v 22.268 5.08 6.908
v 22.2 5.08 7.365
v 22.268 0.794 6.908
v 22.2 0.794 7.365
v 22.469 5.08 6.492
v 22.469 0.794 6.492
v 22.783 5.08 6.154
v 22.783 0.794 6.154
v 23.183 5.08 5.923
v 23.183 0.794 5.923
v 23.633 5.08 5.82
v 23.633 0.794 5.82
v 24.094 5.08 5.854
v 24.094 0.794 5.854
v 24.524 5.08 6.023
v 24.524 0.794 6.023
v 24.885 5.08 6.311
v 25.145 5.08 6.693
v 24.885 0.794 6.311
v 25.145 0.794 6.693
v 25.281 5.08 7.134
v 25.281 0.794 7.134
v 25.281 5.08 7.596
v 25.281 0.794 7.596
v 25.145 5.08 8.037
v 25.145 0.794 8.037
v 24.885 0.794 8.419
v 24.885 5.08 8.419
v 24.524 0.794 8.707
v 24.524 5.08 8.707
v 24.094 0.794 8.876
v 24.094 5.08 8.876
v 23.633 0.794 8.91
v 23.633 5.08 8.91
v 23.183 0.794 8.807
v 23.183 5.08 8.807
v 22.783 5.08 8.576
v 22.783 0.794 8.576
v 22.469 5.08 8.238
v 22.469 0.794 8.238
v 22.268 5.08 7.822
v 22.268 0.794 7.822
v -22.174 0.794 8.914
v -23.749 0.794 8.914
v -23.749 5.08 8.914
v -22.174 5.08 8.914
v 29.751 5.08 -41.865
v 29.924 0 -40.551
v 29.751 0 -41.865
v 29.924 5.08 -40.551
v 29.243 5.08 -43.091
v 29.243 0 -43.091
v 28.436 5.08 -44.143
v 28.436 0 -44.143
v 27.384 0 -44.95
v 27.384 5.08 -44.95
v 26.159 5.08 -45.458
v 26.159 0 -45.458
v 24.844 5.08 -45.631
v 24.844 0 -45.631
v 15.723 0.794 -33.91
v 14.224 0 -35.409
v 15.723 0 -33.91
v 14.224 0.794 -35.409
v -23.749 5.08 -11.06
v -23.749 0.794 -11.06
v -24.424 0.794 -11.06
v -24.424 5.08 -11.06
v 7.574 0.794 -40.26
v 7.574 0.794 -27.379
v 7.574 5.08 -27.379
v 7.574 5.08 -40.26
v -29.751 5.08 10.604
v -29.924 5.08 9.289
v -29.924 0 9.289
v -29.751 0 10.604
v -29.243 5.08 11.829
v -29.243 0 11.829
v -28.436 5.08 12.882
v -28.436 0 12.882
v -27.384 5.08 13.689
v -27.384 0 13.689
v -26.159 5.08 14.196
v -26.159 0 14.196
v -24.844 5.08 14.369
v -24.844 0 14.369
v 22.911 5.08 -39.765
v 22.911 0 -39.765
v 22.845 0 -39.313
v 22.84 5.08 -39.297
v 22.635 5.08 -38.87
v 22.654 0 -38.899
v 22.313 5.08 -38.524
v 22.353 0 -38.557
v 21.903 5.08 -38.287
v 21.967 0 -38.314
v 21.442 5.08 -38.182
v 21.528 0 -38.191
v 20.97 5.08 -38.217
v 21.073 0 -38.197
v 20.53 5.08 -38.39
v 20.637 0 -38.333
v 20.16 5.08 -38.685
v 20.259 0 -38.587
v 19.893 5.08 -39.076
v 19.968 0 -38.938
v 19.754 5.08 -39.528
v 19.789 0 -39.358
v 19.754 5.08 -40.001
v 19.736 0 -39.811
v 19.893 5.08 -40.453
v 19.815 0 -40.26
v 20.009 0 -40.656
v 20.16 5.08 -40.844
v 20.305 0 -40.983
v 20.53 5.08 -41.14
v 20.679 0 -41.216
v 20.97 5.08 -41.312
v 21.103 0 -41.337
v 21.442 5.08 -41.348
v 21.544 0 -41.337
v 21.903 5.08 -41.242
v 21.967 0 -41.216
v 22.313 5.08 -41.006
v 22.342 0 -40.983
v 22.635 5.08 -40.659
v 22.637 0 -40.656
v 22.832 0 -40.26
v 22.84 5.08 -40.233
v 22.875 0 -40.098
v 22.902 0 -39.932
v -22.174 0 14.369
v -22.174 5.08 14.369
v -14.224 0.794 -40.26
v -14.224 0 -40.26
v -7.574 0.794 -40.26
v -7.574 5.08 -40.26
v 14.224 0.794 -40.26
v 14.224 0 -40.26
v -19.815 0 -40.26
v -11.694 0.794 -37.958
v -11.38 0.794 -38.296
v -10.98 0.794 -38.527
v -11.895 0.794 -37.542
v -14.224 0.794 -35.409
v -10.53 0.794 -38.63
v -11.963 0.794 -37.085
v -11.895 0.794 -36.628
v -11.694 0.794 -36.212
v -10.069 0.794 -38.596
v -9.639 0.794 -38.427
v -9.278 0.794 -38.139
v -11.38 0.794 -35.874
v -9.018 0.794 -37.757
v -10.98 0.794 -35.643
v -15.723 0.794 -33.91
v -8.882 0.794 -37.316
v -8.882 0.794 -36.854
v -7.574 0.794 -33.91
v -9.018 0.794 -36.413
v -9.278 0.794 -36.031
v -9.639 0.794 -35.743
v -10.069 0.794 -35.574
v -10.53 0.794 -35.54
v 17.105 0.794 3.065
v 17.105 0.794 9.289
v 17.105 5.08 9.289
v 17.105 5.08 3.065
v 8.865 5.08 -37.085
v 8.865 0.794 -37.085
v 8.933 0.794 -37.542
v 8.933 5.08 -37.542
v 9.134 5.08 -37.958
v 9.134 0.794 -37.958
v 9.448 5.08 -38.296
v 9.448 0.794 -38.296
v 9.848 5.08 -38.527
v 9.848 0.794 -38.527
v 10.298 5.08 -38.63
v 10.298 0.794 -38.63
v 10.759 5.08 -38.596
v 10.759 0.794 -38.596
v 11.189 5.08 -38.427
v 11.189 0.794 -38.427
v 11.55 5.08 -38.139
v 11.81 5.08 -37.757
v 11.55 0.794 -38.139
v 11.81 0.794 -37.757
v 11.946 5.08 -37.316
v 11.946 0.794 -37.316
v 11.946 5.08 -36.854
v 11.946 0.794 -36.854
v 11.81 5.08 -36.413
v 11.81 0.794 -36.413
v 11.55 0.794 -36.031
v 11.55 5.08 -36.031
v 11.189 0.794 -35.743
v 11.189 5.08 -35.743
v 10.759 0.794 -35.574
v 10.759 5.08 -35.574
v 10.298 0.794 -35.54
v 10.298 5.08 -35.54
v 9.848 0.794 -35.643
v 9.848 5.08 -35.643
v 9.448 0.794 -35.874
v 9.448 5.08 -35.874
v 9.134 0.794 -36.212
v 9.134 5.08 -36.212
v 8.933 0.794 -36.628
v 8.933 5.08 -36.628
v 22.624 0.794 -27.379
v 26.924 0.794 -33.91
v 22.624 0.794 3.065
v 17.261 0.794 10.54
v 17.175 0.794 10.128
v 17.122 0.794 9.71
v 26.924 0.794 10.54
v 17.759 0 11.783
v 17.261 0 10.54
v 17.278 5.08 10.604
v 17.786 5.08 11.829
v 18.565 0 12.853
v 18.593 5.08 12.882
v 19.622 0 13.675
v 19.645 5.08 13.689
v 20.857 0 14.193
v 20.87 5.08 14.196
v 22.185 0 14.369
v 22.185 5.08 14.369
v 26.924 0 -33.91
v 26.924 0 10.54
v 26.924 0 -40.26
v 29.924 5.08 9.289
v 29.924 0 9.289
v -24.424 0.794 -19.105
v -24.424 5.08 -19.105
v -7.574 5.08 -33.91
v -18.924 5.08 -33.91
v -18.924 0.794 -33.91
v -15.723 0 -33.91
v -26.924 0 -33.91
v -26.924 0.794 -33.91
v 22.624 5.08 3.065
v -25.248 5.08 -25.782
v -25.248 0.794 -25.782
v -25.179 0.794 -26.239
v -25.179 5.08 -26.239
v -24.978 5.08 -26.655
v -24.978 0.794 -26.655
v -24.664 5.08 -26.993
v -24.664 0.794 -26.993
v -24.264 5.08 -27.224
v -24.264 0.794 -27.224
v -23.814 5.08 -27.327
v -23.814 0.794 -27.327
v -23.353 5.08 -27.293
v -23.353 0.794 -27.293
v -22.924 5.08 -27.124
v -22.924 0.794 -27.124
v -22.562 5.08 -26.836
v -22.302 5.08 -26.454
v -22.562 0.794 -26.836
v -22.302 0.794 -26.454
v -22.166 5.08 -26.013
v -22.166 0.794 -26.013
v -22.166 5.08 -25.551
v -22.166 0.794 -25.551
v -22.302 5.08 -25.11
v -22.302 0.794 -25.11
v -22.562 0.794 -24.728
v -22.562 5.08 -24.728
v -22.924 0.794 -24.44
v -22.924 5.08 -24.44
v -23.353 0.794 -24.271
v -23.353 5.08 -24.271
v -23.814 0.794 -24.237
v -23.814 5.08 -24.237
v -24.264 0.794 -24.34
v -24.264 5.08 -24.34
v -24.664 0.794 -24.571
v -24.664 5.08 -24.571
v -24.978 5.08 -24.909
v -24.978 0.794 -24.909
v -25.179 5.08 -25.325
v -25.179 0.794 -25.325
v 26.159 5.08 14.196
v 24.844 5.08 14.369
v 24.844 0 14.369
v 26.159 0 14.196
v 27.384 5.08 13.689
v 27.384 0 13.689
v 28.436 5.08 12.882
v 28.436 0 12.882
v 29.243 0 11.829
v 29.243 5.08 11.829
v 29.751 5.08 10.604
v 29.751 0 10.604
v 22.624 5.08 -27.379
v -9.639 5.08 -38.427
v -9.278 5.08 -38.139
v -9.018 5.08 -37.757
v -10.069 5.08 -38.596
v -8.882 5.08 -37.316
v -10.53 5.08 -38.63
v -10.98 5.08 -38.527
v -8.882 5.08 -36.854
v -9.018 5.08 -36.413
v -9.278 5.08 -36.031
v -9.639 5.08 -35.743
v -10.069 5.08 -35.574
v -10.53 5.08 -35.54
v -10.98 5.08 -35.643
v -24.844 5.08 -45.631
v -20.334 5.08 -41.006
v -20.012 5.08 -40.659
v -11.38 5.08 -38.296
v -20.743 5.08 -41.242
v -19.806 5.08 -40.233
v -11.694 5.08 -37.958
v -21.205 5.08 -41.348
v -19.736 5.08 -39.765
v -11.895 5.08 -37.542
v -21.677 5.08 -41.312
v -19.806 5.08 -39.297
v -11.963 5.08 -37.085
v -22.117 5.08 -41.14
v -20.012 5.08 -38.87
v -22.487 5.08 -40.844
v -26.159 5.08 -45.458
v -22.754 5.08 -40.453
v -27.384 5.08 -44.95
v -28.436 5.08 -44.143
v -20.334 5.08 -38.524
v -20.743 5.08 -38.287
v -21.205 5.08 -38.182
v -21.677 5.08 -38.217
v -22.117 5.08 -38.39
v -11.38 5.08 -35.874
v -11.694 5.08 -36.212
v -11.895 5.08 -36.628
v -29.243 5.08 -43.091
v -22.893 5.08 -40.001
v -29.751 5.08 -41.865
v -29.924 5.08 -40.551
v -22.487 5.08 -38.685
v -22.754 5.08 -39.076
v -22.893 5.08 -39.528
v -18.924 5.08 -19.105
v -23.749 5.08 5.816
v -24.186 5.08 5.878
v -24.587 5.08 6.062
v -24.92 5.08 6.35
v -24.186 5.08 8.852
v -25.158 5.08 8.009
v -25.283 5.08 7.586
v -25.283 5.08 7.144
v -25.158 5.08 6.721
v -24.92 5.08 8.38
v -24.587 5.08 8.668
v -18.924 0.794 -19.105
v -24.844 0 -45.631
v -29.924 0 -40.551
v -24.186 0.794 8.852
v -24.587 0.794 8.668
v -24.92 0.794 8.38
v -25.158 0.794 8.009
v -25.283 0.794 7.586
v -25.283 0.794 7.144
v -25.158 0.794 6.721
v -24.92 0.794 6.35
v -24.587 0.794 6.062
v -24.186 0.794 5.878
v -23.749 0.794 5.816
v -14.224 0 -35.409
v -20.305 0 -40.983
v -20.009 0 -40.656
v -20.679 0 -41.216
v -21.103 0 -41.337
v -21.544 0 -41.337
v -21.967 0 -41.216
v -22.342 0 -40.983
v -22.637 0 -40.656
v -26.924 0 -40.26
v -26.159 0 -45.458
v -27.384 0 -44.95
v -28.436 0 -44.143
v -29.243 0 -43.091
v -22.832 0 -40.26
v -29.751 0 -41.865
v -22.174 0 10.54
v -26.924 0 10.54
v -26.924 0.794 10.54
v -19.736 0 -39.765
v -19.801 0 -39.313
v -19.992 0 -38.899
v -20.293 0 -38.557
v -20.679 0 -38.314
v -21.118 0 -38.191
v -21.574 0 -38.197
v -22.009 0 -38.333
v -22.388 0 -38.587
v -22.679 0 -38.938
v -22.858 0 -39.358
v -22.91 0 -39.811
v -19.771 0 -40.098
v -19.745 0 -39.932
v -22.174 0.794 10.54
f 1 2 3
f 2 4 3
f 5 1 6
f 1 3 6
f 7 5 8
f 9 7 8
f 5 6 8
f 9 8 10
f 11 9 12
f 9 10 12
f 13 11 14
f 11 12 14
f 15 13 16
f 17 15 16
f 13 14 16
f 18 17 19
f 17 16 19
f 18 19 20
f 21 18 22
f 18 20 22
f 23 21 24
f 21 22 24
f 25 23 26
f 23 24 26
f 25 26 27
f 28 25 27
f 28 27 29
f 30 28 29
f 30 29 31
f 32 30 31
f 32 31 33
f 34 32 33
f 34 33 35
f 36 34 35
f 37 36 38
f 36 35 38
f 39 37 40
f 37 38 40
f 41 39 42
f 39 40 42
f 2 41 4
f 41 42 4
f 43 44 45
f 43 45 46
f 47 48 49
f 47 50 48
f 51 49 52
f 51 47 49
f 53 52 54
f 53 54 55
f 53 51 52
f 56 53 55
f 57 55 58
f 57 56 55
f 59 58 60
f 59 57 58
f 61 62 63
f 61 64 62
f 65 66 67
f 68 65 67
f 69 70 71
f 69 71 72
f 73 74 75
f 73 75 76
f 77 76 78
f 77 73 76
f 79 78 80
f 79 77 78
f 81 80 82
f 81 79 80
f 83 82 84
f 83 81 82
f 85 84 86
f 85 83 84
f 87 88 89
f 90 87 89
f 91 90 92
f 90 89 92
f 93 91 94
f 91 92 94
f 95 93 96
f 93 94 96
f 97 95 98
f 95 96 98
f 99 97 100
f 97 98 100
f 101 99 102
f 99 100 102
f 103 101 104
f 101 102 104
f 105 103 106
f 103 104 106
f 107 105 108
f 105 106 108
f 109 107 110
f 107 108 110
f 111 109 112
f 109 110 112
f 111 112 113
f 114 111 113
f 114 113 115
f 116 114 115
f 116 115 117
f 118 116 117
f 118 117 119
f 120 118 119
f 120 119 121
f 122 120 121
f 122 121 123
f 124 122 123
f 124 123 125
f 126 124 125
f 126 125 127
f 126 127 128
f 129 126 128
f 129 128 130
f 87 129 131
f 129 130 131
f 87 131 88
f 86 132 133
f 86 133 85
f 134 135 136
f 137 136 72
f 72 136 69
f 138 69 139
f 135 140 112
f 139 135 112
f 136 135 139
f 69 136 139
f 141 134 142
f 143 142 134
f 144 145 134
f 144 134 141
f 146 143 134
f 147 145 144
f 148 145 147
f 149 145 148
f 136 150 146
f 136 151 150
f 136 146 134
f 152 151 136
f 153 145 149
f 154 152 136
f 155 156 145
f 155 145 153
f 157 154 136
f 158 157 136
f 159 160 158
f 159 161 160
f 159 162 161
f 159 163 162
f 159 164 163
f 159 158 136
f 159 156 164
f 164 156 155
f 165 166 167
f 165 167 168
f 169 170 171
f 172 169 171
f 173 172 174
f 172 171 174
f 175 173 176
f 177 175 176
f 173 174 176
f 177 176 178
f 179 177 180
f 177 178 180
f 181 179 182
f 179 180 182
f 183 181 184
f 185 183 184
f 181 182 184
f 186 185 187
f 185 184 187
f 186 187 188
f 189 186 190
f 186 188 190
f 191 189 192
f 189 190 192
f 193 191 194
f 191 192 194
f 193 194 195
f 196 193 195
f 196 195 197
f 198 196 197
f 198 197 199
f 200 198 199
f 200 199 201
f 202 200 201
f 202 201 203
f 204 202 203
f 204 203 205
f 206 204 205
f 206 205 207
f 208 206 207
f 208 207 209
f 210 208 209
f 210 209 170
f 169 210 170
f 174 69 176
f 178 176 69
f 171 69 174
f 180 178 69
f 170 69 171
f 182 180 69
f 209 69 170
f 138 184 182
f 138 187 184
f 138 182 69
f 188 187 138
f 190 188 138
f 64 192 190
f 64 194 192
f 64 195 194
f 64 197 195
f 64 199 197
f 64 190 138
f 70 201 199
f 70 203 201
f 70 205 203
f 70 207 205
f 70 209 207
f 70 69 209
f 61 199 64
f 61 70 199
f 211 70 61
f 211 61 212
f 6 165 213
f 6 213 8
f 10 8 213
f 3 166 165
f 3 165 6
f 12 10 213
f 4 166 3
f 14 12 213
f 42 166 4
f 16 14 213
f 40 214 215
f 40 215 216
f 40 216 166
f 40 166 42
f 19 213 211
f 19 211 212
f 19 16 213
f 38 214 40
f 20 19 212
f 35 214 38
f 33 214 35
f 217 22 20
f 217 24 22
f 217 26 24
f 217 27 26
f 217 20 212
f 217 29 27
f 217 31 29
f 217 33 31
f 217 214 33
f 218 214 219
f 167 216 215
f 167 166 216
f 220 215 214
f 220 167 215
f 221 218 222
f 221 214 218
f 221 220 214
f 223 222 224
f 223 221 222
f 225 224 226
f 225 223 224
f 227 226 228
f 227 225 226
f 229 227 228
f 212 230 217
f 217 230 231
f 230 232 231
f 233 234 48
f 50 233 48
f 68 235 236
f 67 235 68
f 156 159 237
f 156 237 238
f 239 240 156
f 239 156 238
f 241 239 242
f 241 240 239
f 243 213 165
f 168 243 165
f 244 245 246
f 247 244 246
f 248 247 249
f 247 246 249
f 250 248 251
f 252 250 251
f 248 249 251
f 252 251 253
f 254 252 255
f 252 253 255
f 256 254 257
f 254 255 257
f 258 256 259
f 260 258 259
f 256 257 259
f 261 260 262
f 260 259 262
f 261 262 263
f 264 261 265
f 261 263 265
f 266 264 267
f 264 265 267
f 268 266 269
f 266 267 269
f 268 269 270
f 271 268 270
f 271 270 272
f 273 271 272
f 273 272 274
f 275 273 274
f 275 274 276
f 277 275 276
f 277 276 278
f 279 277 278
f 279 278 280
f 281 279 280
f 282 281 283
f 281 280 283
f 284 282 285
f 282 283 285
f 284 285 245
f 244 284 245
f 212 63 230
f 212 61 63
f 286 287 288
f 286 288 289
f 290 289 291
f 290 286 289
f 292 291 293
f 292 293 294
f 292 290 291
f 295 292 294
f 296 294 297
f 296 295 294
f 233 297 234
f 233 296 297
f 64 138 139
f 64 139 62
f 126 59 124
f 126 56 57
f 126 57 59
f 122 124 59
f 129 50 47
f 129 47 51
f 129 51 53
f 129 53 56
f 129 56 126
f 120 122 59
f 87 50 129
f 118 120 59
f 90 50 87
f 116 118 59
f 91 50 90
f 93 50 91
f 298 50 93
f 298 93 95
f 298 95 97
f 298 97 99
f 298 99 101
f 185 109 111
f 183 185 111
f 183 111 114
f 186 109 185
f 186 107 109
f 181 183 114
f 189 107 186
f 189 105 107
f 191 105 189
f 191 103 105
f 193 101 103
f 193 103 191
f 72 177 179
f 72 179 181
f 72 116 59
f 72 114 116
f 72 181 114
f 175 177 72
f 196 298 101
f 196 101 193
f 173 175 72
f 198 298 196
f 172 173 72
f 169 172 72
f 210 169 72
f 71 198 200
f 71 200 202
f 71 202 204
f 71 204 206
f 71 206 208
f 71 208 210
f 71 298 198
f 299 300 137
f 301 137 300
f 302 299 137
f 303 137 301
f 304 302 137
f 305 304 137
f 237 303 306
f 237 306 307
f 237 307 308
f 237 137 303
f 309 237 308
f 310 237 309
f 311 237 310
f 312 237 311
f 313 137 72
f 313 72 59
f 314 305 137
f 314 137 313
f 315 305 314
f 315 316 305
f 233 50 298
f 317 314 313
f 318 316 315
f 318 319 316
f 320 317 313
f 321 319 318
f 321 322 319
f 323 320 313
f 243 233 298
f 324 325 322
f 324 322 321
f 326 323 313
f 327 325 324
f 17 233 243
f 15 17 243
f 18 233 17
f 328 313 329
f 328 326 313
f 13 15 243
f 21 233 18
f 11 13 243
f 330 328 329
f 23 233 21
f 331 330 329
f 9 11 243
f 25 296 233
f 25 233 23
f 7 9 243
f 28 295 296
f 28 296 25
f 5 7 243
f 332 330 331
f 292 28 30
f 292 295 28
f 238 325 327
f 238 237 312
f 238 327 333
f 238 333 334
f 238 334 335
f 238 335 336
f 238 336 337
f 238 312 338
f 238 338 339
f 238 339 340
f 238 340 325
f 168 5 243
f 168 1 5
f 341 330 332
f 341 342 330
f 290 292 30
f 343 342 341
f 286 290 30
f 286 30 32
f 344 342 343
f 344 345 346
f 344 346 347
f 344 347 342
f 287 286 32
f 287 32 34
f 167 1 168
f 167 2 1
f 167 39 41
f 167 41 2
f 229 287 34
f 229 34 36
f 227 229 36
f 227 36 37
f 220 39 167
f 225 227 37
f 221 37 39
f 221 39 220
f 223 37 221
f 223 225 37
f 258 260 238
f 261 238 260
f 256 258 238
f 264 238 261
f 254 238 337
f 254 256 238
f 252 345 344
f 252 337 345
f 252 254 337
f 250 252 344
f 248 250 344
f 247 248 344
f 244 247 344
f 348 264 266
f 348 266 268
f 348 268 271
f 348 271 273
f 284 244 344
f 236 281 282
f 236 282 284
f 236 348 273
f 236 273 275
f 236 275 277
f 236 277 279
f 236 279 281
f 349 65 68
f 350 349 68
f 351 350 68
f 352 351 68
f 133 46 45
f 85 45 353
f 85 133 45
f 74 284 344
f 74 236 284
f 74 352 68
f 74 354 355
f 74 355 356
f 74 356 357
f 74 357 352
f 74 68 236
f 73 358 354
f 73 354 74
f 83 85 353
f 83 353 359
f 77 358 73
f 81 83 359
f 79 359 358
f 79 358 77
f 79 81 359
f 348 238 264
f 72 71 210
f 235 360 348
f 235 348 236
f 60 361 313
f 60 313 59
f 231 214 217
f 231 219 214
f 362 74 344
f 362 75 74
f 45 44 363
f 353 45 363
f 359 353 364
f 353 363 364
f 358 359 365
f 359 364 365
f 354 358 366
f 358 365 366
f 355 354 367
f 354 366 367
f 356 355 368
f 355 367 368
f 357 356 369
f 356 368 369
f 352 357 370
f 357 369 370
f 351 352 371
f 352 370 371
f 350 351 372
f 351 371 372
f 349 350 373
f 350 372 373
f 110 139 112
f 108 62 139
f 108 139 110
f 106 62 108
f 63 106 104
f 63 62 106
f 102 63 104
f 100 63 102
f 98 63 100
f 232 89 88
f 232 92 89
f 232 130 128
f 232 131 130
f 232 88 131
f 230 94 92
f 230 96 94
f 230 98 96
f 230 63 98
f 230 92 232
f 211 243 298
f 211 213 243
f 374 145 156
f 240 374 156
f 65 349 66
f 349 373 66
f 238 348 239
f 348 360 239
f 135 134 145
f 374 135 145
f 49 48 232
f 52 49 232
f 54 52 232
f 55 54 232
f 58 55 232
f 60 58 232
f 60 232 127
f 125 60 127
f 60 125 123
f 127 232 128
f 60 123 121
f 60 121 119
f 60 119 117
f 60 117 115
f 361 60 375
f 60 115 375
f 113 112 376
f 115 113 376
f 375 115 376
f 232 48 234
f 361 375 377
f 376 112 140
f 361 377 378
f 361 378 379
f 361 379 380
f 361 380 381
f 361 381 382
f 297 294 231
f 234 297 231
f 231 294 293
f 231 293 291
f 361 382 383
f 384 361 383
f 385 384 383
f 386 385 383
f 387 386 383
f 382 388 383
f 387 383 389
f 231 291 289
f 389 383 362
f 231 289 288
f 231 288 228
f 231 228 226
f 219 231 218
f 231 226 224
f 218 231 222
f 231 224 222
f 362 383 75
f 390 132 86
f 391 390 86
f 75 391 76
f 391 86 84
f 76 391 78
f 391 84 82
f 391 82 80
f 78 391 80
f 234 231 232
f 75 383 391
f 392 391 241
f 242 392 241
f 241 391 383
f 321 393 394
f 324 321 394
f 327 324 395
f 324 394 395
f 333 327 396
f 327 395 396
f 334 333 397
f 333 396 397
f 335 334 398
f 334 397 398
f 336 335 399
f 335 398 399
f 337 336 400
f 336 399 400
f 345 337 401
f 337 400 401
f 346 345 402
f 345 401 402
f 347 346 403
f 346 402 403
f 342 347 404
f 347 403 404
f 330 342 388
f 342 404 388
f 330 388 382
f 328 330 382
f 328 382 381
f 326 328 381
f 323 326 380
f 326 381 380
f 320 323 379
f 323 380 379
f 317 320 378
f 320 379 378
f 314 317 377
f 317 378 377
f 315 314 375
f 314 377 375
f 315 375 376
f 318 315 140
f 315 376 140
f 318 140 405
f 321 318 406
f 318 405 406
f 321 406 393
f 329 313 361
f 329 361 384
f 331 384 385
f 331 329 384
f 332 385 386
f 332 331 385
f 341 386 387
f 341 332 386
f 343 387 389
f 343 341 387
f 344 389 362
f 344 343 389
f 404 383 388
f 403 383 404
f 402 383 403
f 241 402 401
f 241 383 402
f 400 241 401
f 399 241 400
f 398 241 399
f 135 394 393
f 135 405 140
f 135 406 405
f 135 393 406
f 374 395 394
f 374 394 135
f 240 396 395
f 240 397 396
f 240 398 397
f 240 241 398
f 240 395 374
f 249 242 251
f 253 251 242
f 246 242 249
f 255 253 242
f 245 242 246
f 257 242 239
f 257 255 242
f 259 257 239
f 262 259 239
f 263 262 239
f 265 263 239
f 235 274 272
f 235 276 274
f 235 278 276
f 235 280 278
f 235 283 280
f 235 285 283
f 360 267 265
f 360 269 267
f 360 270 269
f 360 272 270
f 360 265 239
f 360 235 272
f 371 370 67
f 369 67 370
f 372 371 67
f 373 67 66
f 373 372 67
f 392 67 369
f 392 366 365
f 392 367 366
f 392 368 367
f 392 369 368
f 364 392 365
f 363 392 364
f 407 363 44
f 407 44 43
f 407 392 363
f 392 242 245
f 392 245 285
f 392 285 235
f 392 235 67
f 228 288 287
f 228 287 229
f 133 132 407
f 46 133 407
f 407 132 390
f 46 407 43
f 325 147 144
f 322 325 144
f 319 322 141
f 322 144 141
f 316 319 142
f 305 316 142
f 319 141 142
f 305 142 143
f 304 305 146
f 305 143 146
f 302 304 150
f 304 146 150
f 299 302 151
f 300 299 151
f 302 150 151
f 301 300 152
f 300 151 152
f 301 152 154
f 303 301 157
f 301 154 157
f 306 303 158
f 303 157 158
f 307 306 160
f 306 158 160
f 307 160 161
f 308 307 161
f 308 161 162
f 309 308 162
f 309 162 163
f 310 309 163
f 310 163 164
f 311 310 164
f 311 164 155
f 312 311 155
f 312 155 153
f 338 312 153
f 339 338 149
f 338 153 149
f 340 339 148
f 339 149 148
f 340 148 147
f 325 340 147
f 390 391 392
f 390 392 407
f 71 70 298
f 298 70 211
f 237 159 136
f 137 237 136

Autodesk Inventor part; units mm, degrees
ref_plane "YZ Plane" through (0, 0, 0) normal (1, 0, 0) x (0, 1, 0)
ref_plane "XZ Plane" through (0, 0, 0) normal (0, 1, 0) x (-1, 0, 0)
ref_plane "XY Plane" through (0, 0, 0) normal (0, 0, 1) x (1, 0, 0)
sketch "Sketch1" plane through (0, 0, 0) normal (0, 1, 0) x (-1, 0, 0)
  line L0 (-29.924, 14.3694) -> (-29.924, -45.6306)
  line L1 (29.924, 14.3694) -> (29.924, -45.6306)
  line L2 (-7.574, -27.3788) -> (-7.574, -40.26)
  line L3 (-7.574, -40.26) -> (7.574, -40.26)
  line L4 (29.924, -45.6306) -> (-29.924, -45.6306)
  circle A0 centre (-23.749, 7.365) radius 1.5494
  arc A1 (23.749, 5.8156) -> (23.749, 8.9144) centre (23.749, 7.365) ccw
  circle A2 centre (10.414, -37.085) radius 1.5494
  line L5 (7.574, -33.91) -> (7.574, -40.26)
  circle A3 centre (23.6982, -25.782) radius 1.5494
  line L6 (7.574, -33.91) -> (18.924, -33.91)
  line L7 (-17.105, 14.3694) -> (-17.105, 3.065)
  line L8 (-22.624, 3.065) -> (-17.105, 3.065)
  line L9 (-22.624, 3.065) -> (-22.624, -27.3788)
  line L10 (-7.574, -27.3788) -> (-22.624, -27.3788)
  line L11 (18.924, -19.105) -> (18.924, -33.91)
  line L12 (18.924, -19.105) -> (24.424, -19.105)
  line L13 (23.749, -11.06) -> (24.424, -11.06)
  line L14 (24.424, -19.105) -> (24.424, -11.06)
  line L15 (-29.924, 14.3694) -> (-17.105, 14.3694)
  line L16 (22.1742, 14.3694) -> (29.924, 14.3694)
  line L17 (23.749, 5.8156) -> (23.7568, 5.8156)
  line L18 (23.749, 5.587) -> (23.749, -11.06)
  line L19 (22.1742, 14.3694) -> (22.1742, 8.9144)
  circle A4 centre (-10.414, -37.085) radius 1.5494
  line L20 (23.749, 5.587) -> (23.749, 5.8156)
  line L21 (23.749, 8.9144) -> (22.1742, 8.9144)
  point P0 (0, 0)
  point P1 (0, 0)
  dimension "d0" = 60
  dimension "d7" = 6.2258
  dimension "d8" = 19.8486
  dimension "d9" = 3.0988
  dimension "d12" = 12.8811
  dimension "d14" = 6.175
  dimension "d16" = 12.819
  dimension "d19" = 11
  dimension "d21" = 26.5256
  dimension "d22" = 34.5706
  dimension "d25" = 48.6956
  dimension "d27" = 5.5
  dimension "d28" = 6.175
  dimension "d30" = 7.3
  dimension "d31" = 11.7206
  dimension "d34" = 3.0988
  dimension "d35" = 3.0988
  dimension "d36" = 3.0988
  dimension "d38" = 8.5456
  dimension "d39" = 19.51
  dimension "d40" = 3.0988
  dimension "d41" = 8.5456
  dimension "d42" = 19.51
  dimension "d43" = 52.9956
  dimension "d44" = 6.175
  dimension "d176" = 5.455
  dimension "d177" = 7.7498
extrude "Extrusion1" add sketch "Sketch1" along normal blind 5.08 contours L15 L7 L8 L9 L10 L2 L3 L5 L6 L11 L12 L14 L13 L18 L20 A1 L21 L19 L16 L1 L4 L0 | A0 | A2 | A3 | A4
sketch "Sketch2" plane through (0, 0, 0) normal (0, -1, 0) x (1, 0, 0)
  line L0 (7.574, -40.26) -> (-7.574, -40.26) projected
  line L1 (-29.924, 14.3694) -> (-29.924, -45.6306) projected
  line L2 (-22.1742, 14.3694) -> (-29.924, 14.3694) projected
  line L3 (29.924, 14.3694) -> (17.105, 14.3694) projected
  line L4 (29.924, -45.6306) -> (29.924, 14.3694) projected
  line L5 (-26.924, 10.54) -> (26.924, 10.54)
  line L6 (-26.924, 10.54) -> (-26.924, -40.26)
  line L7 (-26.924, -40.26) -> (26.924, -40.26)
  line L8 (26.924, -40.26) -> (26.924, 10.54)
  point P0 (0, 0)
  dimension "d52" = 53.848
  dimension "d53" = 50.8
extrude "Extrusion3" cut sketch "Sketch2" against normal blind 0.7937
extrude "Extrusion2" cut sketch "Sketch1" along normal up to next contours A0 | A2 | A3 | A4
fillet "Fillet1" radius 5.08 4 edges at (29.924, 2.54, 14.3694) (29.924, 2.54, -45.6306) (-29.924, 2.54, -45.6306) (-29.924, 2.54, 14.3694)
fillet "Fillet2" radius 5.08 1 edges at (17.105, 2.54, 14.3694)
sketch "Sketch3" plane through (0, 0.7938, 0) normal (0, -1, 0) x (1, 0, 0)
  line L0 (-26.924, -40.26) -> (-26.924, 10.54) projected
  line L1 (-18.924, -33.91) -> (-7.574, -33.91) projected
  line L2 (-26.924, -40.26) -> (-14.224, -40.26)
  line L3 (-15.7226, -33.91) -> (-26.924, -33.91)
  line L4 (-26.924, -33.91) -> (-26.924, -40.26)
  line L5 (26.924, -40.26) -> (7.574, -40.26) projected
  line L6 (26.924, -40.26) -> (14.224, -40.26)
  line L7 (15.7226, -33.91) -> (26.924, -33.91)
  line L8 (26.924, -33.91) -> (26.924, -40.26)
  line L9 (-14.224, -40.26) -> (-14.224, -35.4086)
  line L10 (14.224, -40.26) -> (14.224, -35.4086)
  line L11 (14.224, -35.4086) -> (15.7226, -33.91)
  line L12 (-14.224, -35.4086) -> (-15.7226, -33.91)
  circle A0 centre (10.414, -37.085) radius 1.5494 projected
  circle A1 centre (-10.414, -37.085) radius 1.5494 projected
  point P0 (0, 0)
  dimension "d58" = 11.2014
  dimension "d59" = 11.2014
  dimension "d60" = 4.8514
  dimension "d61" = 4.8514
  dimension "d64" = 6.35
  dimension "d170" = 3.81
  dimension "d171" = 3.81
extrude "Extrusion4" add sketch "Sketch3" along normal blind 0.7937 contours L0 L3 L1 L12 L9 L2 | L5 L10 L11 L7 L8
sketch "Sketch4" plane through (0, 0, 0) normal (0, -1, 0) x (1, 0, 0)
  line L0 (0, -57.6306) -> (0, 26.3694) projected
  circle A0 centre (-21.3233, -39.7647) radius 1.5875
  line L1 (-15.7226, -33.91) -> (-26.924, -33.91) projected
  line L2 (-14.224, -40.26) -> (-14.224, -35.4086) projected
  circle A1 centre (21.3233, -39.7647) radius 1.5875
  dimension "d172" = 3.175
  dimension "d173" = 5.8547
  dimension "d174" = 7.0993
extrude "Extrusion5" cut sketch "Sketch4" against normal up to next
equation "\"d42\" = d39"
properties part number "back-cam"
